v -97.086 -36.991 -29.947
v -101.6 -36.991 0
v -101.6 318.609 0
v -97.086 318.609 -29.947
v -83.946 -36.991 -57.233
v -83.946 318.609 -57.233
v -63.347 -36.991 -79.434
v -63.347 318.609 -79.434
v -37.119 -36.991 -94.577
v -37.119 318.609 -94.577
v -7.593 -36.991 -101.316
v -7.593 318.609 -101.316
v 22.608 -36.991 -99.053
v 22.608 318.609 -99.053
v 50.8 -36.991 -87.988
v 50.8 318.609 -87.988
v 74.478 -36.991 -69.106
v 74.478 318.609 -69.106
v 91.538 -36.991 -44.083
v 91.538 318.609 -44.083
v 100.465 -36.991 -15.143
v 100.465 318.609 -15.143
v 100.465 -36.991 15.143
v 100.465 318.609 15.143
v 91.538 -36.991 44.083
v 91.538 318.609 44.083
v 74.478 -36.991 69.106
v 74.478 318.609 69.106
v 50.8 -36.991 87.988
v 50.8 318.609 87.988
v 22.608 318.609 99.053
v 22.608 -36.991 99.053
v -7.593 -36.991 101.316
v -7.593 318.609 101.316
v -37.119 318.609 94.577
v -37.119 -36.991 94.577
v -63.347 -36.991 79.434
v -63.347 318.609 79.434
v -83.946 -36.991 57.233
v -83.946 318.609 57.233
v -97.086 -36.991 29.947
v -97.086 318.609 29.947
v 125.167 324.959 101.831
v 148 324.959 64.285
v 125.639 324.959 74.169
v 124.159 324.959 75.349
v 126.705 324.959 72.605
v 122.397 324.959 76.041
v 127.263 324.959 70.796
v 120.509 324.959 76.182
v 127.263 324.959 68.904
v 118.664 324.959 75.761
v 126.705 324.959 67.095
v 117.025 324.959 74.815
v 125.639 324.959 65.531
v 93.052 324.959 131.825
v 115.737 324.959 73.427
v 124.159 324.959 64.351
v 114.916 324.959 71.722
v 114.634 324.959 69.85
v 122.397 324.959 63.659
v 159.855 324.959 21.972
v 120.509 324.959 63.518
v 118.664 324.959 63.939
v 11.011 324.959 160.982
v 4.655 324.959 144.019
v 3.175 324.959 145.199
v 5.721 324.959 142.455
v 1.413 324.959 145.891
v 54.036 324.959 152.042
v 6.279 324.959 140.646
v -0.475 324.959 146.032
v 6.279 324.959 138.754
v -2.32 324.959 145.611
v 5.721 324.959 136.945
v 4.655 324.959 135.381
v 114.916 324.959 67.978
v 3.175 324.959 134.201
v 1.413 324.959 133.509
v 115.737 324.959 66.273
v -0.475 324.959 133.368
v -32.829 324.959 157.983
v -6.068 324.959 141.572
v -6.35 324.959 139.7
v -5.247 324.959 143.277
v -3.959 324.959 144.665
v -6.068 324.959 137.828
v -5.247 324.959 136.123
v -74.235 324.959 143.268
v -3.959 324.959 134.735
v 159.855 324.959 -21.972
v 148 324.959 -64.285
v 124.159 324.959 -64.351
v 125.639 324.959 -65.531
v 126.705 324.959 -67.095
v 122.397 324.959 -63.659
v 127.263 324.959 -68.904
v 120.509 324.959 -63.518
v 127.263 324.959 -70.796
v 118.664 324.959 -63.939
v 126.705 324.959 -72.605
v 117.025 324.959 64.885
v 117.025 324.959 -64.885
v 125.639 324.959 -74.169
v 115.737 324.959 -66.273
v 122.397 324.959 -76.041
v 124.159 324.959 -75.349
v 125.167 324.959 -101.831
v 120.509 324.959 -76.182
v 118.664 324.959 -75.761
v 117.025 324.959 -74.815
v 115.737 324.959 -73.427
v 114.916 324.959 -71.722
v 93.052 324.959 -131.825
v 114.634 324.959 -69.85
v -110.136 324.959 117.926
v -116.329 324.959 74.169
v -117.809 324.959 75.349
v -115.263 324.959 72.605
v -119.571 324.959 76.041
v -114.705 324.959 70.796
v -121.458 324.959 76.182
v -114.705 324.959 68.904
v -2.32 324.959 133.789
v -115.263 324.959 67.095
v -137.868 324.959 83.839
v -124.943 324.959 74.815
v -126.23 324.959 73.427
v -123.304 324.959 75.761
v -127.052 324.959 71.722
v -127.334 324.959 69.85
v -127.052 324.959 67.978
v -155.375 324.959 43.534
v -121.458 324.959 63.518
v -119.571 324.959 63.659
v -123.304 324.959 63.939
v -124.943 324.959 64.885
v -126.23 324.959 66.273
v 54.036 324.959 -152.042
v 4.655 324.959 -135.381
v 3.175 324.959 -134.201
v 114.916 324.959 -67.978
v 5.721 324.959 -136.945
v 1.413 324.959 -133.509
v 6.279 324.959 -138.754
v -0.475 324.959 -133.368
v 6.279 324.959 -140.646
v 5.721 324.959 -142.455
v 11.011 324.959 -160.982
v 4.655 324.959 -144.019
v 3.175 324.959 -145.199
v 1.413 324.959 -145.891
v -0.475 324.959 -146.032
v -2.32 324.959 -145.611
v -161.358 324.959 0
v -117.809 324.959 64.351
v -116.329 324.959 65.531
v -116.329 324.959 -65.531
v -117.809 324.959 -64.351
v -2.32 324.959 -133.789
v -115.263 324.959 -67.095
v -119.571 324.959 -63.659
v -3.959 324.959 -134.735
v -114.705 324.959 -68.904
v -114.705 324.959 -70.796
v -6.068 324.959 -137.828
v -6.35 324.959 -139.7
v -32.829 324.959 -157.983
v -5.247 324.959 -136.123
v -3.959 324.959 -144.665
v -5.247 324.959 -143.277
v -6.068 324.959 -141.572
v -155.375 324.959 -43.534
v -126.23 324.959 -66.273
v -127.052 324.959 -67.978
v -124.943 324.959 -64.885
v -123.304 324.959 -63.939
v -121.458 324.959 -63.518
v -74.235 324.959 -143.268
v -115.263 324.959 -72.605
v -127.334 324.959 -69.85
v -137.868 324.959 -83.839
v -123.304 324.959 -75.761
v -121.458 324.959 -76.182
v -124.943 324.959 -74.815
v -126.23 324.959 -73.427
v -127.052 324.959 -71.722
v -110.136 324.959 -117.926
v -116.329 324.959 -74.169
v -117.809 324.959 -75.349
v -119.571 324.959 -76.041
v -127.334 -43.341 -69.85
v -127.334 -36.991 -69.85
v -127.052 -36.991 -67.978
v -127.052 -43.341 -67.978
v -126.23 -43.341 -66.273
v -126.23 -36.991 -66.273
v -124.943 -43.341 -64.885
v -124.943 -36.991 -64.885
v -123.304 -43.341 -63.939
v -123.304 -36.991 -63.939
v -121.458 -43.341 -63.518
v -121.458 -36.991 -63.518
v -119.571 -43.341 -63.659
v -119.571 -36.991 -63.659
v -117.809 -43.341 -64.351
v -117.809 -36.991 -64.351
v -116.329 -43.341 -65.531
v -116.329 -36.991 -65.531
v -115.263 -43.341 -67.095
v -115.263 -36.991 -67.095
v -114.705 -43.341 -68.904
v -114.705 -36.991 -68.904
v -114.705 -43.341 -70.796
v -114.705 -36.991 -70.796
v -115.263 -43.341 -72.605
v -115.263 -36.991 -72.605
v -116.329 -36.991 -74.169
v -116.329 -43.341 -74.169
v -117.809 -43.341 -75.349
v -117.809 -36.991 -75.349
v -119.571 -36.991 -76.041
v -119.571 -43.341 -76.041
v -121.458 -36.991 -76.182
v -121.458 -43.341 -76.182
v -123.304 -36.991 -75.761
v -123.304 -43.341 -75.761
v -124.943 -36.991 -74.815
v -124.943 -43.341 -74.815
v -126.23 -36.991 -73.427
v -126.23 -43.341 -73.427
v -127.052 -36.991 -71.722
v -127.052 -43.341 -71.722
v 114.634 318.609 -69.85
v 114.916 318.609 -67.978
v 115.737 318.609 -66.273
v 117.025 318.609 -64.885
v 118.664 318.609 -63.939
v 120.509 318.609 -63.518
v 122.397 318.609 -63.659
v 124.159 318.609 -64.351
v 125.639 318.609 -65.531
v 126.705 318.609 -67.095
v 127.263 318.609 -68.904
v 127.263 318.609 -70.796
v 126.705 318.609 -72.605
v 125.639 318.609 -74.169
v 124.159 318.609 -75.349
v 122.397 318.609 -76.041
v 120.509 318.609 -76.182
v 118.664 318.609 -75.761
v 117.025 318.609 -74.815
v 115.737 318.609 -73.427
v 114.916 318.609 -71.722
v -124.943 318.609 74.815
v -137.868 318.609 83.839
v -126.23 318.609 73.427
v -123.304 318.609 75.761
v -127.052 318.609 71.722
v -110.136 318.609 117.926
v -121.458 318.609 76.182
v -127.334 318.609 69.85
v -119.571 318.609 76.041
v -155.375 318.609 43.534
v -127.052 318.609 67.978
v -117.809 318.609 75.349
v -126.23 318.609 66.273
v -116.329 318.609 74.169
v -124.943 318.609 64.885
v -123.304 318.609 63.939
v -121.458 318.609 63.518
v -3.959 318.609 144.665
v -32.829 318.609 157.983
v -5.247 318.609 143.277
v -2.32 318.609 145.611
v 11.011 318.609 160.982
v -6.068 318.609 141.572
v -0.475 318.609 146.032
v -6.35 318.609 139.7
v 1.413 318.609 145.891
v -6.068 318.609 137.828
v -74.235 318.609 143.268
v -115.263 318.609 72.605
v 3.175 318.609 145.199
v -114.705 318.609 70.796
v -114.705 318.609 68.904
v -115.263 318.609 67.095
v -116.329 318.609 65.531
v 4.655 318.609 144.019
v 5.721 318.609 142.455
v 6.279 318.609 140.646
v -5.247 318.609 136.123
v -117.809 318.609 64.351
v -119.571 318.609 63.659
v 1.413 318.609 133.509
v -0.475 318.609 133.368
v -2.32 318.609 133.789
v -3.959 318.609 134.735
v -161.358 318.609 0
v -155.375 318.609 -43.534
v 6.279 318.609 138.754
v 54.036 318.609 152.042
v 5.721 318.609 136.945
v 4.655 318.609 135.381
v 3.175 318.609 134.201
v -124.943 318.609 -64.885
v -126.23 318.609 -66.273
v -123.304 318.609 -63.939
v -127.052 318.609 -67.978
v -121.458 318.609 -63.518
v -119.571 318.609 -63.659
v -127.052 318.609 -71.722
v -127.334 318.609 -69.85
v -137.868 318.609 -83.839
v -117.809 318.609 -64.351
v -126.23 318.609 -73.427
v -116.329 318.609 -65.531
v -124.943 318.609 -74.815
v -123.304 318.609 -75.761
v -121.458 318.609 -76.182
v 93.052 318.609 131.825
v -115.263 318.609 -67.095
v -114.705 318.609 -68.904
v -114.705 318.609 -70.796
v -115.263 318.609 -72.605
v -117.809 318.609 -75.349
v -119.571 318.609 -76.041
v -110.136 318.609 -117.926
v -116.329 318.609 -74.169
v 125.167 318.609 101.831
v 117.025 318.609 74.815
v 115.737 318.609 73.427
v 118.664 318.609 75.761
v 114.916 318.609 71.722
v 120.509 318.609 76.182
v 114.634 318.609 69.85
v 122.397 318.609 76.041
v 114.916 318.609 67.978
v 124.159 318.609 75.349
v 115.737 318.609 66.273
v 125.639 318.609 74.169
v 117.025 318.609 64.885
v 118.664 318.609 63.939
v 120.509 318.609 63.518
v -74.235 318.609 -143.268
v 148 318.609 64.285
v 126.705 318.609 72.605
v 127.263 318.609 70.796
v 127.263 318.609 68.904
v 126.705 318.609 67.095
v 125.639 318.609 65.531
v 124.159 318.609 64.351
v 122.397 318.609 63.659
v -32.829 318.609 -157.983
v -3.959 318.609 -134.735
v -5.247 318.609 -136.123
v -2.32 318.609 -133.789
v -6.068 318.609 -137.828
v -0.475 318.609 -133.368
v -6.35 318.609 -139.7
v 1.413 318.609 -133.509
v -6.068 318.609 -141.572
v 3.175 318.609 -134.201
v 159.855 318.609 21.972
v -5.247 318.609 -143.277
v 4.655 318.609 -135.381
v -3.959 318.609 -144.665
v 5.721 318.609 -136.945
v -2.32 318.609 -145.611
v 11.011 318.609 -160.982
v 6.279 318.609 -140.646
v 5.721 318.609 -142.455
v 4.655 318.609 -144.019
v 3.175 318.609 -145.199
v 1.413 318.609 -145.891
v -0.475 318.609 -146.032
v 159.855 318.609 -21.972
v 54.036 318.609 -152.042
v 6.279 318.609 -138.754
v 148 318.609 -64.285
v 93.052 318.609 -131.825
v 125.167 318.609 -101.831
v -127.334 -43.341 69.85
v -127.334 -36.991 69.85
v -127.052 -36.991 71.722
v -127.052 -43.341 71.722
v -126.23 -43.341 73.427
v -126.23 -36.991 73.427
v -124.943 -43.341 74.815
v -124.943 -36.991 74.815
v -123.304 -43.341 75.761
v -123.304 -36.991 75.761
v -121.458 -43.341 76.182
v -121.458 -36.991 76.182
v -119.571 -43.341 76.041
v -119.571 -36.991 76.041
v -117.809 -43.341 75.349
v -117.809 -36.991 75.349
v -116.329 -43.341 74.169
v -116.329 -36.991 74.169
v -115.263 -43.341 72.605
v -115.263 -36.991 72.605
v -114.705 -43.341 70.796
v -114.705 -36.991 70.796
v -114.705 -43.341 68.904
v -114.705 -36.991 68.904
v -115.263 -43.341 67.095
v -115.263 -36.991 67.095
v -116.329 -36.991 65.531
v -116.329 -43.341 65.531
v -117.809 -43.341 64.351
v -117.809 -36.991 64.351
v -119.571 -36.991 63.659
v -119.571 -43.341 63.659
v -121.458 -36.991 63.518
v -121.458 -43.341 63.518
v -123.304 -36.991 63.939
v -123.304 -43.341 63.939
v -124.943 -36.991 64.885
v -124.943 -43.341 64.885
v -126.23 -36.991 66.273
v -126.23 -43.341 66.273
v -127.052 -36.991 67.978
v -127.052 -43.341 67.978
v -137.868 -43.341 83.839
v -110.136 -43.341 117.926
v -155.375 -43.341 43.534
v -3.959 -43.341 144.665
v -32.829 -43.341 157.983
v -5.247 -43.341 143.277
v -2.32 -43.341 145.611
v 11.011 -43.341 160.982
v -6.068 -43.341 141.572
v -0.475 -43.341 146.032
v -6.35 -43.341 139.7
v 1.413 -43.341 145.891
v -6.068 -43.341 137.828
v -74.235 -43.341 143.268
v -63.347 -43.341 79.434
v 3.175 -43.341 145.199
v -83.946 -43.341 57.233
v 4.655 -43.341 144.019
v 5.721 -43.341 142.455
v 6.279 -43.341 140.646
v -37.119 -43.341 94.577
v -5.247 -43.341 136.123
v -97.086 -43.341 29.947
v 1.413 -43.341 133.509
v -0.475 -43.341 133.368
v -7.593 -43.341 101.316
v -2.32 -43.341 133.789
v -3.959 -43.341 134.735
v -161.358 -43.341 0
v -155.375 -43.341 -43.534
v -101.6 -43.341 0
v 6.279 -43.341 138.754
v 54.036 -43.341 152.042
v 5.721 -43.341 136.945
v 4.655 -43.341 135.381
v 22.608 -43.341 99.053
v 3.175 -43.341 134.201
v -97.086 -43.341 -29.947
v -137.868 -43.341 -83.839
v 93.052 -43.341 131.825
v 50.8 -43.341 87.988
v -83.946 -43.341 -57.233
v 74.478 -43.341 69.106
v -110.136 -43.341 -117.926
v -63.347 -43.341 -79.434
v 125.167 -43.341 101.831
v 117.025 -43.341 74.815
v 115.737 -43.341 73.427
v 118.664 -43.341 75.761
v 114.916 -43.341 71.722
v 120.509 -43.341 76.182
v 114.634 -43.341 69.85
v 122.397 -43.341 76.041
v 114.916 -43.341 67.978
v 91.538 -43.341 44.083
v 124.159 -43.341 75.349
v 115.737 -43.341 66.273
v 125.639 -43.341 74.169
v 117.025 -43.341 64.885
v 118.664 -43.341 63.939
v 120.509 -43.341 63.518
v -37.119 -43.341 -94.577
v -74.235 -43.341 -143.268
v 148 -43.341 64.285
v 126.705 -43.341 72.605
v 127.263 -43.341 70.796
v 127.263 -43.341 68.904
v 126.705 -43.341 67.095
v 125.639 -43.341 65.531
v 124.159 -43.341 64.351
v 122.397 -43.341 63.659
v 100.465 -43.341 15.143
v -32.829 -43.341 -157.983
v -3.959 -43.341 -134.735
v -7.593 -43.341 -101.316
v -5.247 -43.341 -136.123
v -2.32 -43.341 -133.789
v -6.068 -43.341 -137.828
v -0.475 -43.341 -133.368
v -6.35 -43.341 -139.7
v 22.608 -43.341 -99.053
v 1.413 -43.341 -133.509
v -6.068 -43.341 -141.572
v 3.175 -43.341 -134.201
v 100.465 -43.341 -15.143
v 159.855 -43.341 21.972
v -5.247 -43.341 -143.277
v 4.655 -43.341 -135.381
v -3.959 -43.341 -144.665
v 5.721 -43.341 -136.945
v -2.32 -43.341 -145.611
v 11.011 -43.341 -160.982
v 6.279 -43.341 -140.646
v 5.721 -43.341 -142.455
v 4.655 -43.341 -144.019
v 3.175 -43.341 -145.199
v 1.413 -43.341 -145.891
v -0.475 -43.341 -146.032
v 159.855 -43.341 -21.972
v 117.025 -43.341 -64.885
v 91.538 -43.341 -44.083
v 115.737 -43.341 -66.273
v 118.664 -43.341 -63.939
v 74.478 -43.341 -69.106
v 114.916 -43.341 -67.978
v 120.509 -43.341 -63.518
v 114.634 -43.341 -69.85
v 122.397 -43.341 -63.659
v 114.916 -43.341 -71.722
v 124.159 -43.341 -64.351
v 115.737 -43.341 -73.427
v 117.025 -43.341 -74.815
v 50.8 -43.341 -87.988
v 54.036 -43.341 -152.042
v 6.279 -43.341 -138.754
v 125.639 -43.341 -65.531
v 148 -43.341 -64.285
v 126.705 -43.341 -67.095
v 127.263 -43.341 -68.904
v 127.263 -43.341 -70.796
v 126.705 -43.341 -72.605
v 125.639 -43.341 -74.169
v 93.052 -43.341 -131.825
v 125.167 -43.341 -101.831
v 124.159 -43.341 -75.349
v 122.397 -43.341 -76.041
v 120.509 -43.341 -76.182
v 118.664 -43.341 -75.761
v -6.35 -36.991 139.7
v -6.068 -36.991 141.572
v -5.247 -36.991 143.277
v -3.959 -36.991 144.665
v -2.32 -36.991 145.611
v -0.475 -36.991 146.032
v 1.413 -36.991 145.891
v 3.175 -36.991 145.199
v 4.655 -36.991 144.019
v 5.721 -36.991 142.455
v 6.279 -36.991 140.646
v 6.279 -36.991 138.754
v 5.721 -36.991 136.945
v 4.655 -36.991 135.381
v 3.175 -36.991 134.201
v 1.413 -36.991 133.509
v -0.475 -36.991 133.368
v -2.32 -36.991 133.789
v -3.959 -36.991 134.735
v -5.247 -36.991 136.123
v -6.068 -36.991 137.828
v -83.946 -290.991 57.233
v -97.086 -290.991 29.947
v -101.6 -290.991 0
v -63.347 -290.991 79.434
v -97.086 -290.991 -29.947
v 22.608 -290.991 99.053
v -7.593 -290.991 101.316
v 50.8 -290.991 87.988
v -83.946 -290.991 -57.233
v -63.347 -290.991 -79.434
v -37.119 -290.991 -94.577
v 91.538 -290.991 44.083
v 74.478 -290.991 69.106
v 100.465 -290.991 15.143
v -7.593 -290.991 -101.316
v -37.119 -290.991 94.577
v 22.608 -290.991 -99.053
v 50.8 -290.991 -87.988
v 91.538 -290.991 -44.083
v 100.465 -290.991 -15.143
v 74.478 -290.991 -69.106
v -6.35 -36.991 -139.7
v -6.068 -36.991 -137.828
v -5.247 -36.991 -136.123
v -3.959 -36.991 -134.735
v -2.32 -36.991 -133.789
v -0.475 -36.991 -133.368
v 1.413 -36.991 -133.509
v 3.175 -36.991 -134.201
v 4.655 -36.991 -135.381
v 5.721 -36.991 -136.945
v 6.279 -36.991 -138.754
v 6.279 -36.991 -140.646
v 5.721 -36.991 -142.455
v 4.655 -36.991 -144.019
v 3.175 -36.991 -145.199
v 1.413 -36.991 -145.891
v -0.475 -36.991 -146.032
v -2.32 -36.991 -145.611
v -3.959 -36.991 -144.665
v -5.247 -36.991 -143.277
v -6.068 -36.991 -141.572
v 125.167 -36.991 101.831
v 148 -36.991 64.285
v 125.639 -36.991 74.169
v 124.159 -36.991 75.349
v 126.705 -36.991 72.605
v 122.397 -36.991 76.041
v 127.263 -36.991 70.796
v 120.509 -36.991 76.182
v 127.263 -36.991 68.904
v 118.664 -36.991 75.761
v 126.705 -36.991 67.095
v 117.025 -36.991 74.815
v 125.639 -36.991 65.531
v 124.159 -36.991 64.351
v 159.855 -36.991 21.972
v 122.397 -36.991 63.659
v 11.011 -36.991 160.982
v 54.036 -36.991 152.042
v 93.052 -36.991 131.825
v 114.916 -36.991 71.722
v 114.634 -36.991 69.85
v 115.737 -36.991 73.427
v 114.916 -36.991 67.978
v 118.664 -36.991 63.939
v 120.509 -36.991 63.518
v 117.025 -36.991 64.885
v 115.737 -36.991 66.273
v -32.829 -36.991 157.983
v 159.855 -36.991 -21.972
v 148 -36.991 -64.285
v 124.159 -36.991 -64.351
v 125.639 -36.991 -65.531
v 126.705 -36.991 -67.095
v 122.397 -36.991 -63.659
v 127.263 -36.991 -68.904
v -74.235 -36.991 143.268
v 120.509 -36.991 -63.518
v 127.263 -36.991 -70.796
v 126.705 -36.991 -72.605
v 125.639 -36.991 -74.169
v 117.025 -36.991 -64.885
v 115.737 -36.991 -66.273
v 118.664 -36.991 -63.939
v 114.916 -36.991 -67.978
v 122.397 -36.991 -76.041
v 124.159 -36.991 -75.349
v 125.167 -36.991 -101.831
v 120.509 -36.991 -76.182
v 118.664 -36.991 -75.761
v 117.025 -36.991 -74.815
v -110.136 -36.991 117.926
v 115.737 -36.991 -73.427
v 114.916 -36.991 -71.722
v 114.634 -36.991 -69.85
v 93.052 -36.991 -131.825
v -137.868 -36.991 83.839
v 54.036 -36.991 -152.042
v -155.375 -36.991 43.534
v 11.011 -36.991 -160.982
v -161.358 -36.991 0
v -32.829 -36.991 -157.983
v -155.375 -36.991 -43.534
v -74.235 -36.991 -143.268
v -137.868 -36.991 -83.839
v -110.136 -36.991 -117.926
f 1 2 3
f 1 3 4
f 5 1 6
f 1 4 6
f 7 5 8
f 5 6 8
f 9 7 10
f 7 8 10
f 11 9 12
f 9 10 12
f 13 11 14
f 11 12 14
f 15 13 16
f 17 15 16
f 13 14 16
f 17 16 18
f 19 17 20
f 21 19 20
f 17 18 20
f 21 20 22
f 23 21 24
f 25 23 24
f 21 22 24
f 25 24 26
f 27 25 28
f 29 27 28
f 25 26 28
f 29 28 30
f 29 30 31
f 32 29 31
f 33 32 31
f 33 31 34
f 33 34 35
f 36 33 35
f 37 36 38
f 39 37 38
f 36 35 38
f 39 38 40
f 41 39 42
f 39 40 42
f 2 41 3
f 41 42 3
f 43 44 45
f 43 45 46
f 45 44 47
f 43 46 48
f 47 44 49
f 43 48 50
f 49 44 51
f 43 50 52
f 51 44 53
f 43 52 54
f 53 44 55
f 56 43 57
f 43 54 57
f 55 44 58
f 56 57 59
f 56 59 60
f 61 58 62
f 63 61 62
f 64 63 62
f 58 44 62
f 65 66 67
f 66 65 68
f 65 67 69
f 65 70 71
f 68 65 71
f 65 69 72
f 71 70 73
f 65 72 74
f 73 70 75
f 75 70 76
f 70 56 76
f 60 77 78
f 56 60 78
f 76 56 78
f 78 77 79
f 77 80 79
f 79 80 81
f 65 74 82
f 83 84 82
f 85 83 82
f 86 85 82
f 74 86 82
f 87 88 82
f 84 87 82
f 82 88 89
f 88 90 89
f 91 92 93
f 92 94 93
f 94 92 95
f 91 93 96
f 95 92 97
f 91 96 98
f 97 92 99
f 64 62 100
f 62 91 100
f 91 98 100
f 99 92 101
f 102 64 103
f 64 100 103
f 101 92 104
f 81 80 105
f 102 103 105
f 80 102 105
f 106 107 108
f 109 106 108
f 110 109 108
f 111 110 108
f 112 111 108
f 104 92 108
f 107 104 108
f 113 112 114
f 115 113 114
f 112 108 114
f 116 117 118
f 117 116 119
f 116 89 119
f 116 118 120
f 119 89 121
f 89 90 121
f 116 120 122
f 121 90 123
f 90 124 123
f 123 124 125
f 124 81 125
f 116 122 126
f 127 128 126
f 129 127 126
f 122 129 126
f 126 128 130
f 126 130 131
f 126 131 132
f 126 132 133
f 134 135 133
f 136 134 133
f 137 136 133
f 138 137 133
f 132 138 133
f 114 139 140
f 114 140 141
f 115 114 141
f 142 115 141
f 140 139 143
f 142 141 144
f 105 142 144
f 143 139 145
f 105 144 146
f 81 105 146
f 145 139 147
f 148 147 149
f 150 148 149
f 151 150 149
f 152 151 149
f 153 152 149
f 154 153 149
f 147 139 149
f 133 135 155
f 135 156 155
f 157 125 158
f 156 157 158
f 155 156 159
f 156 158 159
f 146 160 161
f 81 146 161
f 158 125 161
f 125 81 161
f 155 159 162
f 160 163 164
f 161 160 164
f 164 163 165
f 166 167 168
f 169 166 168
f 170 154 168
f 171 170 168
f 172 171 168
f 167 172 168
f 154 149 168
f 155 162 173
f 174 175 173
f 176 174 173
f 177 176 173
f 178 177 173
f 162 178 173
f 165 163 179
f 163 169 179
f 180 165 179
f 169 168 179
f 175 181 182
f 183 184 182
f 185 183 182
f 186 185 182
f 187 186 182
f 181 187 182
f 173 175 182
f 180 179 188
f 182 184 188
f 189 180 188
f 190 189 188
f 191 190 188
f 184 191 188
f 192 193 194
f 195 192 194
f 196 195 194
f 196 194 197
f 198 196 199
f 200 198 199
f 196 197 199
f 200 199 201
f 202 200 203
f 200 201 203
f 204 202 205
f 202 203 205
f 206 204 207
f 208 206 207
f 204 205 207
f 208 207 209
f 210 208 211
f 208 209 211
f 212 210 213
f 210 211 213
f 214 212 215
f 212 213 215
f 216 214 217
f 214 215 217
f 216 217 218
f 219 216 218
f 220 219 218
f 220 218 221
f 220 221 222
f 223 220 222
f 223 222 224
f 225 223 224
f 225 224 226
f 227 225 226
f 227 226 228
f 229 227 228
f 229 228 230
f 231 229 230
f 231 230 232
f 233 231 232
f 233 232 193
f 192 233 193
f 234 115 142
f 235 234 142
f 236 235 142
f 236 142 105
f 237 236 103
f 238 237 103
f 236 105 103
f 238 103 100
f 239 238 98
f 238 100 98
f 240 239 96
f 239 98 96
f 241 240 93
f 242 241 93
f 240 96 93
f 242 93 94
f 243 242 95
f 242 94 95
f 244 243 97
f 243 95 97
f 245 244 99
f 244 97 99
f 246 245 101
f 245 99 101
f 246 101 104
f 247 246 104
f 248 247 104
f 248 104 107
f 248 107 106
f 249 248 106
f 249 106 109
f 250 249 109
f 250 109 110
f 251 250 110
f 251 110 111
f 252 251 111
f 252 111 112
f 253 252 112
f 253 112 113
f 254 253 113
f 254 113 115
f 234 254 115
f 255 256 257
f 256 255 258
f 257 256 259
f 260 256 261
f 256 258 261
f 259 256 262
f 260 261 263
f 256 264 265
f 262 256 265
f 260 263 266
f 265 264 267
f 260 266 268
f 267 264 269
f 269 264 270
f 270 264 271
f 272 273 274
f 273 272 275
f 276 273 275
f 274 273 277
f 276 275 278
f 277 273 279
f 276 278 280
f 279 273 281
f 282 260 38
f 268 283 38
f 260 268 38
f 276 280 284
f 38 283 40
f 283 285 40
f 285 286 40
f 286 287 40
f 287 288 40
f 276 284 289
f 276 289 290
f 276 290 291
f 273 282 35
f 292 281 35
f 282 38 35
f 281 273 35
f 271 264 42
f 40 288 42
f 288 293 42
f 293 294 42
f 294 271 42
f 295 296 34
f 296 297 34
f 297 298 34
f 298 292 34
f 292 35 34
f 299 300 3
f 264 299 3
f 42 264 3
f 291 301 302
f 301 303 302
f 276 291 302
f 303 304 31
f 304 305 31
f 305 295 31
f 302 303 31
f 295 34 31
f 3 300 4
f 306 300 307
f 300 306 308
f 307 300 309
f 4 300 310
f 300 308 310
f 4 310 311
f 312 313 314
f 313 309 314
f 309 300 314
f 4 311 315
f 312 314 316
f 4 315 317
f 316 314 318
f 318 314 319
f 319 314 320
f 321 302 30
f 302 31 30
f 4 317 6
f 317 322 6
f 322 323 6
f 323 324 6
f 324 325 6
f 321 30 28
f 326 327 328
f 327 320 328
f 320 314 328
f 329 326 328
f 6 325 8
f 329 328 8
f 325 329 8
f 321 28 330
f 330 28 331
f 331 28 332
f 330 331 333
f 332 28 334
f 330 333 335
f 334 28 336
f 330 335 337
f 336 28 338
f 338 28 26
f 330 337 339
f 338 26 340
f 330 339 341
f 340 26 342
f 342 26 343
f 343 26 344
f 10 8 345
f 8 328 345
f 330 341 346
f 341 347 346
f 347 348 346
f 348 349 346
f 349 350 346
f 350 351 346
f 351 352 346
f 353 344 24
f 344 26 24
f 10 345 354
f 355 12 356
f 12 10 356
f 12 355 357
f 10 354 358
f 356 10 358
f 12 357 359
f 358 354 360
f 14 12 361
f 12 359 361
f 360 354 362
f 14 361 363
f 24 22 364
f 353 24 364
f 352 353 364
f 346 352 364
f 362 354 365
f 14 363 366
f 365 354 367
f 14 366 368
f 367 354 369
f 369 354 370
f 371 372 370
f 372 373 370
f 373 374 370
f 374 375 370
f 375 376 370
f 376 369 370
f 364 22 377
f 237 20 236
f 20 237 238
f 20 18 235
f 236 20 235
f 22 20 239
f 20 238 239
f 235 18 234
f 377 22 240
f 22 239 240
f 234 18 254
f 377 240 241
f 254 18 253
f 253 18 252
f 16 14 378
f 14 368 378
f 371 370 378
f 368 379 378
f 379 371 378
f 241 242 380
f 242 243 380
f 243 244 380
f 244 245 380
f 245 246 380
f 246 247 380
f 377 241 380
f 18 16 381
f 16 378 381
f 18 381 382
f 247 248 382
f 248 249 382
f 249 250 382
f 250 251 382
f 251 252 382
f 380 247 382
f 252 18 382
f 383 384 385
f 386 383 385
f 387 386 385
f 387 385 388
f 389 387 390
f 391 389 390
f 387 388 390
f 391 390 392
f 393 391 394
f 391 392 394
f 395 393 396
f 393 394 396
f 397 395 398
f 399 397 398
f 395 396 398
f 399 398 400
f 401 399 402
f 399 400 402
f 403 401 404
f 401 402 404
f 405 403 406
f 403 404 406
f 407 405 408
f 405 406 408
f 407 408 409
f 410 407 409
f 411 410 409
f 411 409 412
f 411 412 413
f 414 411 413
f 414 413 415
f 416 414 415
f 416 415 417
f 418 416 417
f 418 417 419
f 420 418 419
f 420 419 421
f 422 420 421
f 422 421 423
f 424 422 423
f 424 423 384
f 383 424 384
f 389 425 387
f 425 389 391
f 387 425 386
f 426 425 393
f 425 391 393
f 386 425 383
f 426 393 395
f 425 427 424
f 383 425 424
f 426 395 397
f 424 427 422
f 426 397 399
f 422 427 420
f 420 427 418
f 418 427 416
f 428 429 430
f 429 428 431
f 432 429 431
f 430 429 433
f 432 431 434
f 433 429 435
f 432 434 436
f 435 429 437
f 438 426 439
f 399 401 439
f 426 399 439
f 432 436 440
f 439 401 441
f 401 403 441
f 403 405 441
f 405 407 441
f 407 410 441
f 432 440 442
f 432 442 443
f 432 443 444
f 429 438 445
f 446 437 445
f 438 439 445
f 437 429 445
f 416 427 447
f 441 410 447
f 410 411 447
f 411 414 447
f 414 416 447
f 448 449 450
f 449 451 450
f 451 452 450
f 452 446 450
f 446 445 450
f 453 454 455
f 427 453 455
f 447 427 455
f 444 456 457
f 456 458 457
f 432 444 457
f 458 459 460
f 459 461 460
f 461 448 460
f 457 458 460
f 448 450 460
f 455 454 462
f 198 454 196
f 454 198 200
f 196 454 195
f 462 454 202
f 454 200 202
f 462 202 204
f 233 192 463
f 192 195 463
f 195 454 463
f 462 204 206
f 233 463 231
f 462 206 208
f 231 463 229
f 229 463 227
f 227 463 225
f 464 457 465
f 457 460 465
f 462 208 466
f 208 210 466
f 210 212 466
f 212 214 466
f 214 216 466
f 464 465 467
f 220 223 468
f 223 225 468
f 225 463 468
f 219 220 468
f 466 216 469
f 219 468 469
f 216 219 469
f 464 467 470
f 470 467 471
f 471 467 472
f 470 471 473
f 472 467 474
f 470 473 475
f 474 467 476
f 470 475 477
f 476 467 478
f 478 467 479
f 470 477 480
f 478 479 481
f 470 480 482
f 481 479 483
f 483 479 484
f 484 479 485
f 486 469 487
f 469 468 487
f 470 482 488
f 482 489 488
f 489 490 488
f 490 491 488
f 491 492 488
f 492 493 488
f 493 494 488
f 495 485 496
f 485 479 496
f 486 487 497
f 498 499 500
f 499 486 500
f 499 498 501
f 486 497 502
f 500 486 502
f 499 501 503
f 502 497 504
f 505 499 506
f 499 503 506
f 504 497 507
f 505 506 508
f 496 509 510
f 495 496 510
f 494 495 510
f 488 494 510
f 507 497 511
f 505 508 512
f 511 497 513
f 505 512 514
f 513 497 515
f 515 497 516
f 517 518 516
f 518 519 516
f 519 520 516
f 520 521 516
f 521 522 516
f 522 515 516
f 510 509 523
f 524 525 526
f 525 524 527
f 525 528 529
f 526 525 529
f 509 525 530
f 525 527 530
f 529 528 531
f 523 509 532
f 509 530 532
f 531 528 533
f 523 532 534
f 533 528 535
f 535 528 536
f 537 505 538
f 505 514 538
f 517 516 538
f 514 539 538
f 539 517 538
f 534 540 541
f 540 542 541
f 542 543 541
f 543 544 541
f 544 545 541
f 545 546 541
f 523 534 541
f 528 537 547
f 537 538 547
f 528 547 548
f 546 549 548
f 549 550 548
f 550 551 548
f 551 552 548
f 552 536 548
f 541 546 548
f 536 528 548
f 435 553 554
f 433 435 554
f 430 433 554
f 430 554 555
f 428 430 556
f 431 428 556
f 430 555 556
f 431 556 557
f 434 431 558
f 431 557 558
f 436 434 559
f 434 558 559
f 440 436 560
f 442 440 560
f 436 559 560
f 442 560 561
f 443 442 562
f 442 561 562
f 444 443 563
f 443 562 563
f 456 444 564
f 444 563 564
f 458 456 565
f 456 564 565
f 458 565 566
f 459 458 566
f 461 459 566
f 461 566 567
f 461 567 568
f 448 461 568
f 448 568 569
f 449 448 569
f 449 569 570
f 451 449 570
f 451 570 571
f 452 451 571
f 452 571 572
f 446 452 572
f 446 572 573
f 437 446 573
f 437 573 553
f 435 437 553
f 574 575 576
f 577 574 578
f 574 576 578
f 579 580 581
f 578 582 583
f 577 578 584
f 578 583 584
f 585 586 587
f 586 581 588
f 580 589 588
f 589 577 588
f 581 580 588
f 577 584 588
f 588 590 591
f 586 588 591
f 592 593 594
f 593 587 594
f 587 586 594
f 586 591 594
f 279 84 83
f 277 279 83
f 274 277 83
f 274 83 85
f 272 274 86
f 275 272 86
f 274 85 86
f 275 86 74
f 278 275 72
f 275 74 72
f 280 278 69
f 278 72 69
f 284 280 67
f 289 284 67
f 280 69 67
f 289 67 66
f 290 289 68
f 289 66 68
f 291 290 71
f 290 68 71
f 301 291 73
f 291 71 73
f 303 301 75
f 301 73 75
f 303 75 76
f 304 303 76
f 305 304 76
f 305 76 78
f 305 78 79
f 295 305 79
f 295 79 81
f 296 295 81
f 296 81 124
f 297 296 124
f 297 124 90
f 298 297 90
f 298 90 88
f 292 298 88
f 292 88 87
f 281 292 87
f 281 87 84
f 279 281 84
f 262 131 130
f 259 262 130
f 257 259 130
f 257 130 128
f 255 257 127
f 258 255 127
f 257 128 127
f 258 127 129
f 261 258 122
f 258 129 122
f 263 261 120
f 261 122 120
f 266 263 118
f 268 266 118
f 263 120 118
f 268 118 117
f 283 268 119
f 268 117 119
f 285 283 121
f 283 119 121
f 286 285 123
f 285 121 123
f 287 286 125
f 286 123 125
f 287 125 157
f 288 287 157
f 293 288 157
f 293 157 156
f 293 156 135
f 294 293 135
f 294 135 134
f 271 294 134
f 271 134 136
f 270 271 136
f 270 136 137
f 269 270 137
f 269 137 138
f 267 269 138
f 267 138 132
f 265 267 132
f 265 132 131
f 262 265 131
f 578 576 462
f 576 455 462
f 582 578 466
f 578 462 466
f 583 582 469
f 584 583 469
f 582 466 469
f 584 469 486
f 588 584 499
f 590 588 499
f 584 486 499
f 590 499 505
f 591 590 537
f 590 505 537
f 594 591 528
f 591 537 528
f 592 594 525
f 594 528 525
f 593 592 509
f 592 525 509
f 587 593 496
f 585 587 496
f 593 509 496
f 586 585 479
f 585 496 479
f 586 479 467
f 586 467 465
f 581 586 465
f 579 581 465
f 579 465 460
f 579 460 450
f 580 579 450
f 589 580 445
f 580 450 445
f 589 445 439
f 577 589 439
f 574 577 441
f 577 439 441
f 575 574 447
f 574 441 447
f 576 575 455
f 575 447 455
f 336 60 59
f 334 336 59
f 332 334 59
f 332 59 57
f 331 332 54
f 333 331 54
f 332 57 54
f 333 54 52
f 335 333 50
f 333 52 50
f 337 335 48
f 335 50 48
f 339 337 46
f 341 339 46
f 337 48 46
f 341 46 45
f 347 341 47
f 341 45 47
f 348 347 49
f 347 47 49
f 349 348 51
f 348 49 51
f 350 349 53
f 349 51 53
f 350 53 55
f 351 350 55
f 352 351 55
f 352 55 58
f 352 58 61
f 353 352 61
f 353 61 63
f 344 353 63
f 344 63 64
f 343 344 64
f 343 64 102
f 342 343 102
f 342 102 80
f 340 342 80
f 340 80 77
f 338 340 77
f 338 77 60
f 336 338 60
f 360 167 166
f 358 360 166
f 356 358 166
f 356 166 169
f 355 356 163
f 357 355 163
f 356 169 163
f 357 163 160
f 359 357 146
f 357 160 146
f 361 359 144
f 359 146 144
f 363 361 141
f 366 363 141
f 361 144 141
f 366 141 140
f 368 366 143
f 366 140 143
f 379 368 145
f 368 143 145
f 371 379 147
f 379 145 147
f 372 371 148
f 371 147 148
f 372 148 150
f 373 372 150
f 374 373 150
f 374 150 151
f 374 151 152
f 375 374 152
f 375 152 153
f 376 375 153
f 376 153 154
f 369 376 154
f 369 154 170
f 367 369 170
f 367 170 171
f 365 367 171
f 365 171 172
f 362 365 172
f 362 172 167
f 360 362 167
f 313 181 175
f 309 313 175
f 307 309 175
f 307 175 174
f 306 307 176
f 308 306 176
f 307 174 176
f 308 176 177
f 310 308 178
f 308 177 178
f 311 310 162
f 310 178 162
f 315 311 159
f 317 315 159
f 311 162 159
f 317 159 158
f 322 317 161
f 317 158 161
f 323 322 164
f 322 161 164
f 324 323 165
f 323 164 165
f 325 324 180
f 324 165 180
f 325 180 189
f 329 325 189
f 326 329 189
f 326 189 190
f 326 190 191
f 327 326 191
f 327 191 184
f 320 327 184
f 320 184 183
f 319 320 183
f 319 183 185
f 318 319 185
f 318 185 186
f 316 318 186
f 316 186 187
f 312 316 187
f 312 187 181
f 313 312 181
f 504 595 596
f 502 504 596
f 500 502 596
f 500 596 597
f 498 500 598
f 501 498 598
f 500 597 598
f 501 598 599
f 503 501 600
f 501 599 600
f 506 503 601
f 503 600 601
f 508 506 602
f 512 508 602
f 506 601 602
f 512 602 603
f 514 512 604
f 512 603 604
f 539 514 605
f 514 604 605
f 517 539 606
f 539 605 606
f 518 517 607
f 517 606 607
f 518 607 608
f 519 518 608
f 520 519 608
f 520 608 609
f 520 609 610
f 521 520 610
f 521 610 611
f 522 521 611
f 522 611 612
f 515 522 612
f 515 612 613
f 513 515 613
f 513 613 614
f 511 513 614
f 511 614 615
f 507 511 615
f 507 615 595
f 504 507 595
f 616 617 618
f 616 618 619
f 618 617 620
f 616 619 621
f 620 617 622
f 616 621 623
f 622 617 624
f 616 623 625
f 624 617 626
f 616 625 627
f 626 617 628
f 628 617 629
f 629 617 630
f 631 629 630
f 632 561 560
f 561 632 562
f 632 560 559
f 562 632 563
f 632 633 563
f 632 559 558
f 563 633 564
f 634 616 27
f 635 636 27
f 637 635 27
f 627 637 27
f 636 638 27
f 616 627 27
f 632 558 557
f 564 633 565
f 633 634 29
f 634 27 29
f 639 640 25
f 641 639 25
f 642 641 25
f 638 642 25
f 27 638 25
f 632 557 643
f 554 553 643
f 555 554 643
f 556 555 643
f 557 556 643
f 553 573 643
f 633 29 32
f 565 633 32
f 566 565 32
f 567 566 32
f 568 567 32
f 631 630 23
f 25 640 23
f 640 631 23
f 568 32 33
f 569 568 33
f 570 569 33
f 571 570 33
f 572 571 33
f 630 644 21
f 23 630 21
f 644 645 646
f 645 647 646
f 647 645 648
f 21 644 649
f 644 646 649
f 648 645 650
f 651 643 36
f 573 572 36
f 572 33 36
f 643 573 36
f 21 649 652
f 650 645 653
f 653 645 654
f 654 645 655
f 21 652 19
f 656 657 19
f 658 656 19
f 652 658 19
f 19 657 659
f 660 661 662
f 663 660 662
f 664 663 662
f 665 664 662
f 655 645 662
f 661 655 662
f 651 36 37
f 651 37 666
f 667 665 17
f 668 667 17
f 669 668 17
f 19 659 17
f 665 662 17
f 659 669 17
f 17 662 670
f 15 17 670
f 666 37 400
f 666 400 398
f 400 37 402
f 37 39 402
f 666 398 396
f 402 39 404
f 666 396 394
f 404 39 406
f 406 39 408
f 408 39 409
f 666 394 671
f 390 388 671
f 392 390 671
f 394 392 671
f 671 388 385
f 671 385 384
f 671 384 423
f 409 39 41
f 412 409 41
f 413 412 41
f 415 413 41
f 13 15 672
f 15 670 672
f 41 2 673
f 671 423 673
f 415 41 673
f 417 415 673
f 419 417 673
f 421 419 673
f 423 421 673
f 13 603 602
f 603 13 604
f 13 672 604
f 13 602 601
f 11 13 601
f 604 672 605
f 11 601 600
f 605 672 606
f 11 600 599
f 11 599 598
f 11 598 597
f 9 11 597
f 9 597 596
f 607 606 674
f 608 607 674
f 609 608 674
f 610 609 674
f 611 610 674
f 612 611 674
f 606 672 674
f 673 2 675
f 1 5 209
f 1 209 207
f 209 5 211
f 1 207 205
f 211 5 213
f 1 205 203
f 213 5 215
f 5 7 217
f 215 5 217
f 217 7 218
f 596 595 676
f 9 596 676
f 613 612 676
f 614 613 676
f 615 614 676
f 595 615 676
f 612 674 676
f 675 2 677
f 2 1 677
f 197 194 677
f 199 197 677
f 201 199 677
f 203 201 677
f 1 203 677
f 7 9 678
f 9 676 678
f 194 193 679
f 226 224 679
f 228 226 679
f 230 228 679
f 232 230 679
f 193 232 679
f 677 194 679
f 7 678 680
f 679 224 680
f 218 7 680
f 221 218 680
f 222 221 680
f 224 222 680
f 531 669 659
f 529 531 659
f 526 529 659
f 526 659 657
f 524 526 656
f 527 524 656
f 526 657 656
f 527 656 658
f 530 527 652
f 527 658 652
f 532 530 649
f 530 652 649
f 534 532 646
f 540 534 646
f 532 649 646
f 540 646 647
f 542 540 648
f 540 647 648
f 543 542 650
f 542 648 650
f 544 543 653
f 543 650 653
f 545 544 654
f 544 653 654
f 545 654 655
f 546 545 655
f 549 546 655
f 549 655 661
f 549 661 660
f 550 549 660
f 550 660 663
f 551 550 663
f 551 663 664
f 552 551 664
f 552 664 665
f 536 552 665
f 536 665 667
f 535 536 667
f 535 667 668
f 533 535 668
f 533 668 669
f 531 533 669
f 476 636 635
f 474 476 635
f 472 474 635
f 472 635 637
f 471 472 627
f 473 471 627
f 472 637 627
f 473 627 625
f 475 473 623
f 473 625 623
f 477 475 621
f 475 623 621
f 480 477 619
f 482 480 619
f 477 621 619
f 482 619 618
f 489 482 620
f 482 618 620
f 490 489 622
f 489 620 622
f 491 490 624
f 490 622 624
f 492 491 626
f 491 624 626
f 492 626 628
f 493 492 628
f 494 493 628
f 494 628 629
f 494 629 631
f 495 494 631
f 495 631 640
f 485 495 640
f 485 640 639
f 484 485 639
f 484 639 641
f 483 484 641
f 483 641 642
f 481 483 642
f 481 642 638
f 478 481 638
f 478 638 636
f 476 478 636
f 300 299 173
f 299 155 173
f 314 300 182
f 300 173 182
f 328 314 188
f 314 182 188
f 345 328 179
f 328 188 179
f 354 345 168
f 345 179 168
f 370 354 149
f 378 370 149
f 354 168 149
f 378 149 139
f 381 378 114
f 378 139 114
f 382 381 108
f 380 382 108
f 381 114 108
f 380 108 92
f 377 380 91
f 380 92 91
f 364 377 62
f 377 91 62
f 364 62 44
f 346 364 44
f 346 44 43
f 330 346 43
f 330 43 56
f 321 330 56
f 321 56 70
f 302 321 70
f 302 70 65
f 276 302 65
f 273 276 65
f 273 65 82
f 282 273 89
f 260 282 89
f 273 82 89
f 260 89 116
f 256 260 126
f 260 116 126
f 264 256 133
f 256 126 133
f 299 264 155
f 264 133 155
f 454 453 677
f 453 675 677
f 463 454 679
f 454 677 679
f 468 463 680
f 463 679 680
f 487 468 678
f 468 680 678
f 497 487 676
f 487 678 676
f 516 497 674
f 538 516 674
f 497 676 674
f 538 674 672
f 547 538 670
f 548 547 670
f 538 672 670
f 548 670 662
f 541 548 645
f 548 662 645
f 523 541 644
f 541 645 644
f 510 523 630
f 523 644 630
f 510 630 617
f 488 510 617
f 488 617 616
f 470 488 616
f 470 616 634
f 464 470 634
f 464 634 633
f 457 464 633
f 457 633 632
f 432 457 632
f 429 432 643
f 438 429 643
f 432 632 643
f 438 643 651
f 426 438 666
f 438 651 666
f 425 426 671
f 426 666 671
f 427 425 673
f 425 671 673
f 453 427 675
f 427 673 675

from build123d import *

# Parameters (mm, degrees)
SKETCH2_R          = 6.35
CUT_EXTRUDE1_DEPTH = 657.861735142


with BuildPart() as part:
    # Sketch1 → Revolve1 (revolve)
    with BuildSketch(Plane.XY, mode=Mode.PRIVATE) as revolve1_sk:
        Polygon((101.6, -36.990823201), (101.6, 318.609176799), (161.358198728, 318.609176799), (161.358198728, 324.959176799), (101.6, 324.959176799), (0, 324.959176799), (0, 318.609176799), (0, -290.990823201), (101.6, -290.990823201), (101.6, -43.340823201), (161.358198728, -43.340823201), (161.358198728, -36.990823201), align=None)
        Polygon((101.6, 324.959176799), (0, 324.959176799), (0, 318.609176799), (0, -290.990823201), (101.6, -290.990823201), (101.6, -43.340823201), (161.358198728, -43.340823201), (161.358198728, -36.990823201), (101.6, -36.990823201), (101.6, 318.609176799), (161.358198728, 318.609176799), (161.358198728, 324.959176799), align=None)
    revolve(revolve1_sk.sketch.rotate(Axis((0, 318.609176799, 0), (0, -1, 0)), 180), axis=Axis((0, 318.609176799, 0), (0, -1, 0)))

    # Sketch2 → Cut-Extrude1 (cut, through all)
    with BuildSketch(Plane(origin=(0, 324.959176799, 0), x_dir=(1, 0, 0), z_dir=(0, 1, 0))):
        with Locations(Location((0, 139.7, 0), (0, 0, 180))):
            Circle(SKETCH2_R)
        with Locations(Location((120.983748909, 69.85, 0), (0, 0, 180))):
            Circle(SKETCH2_R)
        with Locations(Location((120.983748909, -69.85, 0), (0, 0, 180))):
            Circle(SKETCH2_R)
        with Locations(Location((0, -139.7, 0), (0, 0, 180))):
            Circle(SKETCH2_R)
        with Locations(Location((-120.983748909, -69.85, 0), (0, 0, 180))):
            Circle(SKETCH2_R)
        with Locations(Location((-120.983748909, 69.85, 0), (0, 0, 180))):
            Circle(SKETCH2_R)
    extrude(amount=-CUT_EXTRUDE1_DEPTH, mode=Mode.SUBTRACT)


solid = part.part
